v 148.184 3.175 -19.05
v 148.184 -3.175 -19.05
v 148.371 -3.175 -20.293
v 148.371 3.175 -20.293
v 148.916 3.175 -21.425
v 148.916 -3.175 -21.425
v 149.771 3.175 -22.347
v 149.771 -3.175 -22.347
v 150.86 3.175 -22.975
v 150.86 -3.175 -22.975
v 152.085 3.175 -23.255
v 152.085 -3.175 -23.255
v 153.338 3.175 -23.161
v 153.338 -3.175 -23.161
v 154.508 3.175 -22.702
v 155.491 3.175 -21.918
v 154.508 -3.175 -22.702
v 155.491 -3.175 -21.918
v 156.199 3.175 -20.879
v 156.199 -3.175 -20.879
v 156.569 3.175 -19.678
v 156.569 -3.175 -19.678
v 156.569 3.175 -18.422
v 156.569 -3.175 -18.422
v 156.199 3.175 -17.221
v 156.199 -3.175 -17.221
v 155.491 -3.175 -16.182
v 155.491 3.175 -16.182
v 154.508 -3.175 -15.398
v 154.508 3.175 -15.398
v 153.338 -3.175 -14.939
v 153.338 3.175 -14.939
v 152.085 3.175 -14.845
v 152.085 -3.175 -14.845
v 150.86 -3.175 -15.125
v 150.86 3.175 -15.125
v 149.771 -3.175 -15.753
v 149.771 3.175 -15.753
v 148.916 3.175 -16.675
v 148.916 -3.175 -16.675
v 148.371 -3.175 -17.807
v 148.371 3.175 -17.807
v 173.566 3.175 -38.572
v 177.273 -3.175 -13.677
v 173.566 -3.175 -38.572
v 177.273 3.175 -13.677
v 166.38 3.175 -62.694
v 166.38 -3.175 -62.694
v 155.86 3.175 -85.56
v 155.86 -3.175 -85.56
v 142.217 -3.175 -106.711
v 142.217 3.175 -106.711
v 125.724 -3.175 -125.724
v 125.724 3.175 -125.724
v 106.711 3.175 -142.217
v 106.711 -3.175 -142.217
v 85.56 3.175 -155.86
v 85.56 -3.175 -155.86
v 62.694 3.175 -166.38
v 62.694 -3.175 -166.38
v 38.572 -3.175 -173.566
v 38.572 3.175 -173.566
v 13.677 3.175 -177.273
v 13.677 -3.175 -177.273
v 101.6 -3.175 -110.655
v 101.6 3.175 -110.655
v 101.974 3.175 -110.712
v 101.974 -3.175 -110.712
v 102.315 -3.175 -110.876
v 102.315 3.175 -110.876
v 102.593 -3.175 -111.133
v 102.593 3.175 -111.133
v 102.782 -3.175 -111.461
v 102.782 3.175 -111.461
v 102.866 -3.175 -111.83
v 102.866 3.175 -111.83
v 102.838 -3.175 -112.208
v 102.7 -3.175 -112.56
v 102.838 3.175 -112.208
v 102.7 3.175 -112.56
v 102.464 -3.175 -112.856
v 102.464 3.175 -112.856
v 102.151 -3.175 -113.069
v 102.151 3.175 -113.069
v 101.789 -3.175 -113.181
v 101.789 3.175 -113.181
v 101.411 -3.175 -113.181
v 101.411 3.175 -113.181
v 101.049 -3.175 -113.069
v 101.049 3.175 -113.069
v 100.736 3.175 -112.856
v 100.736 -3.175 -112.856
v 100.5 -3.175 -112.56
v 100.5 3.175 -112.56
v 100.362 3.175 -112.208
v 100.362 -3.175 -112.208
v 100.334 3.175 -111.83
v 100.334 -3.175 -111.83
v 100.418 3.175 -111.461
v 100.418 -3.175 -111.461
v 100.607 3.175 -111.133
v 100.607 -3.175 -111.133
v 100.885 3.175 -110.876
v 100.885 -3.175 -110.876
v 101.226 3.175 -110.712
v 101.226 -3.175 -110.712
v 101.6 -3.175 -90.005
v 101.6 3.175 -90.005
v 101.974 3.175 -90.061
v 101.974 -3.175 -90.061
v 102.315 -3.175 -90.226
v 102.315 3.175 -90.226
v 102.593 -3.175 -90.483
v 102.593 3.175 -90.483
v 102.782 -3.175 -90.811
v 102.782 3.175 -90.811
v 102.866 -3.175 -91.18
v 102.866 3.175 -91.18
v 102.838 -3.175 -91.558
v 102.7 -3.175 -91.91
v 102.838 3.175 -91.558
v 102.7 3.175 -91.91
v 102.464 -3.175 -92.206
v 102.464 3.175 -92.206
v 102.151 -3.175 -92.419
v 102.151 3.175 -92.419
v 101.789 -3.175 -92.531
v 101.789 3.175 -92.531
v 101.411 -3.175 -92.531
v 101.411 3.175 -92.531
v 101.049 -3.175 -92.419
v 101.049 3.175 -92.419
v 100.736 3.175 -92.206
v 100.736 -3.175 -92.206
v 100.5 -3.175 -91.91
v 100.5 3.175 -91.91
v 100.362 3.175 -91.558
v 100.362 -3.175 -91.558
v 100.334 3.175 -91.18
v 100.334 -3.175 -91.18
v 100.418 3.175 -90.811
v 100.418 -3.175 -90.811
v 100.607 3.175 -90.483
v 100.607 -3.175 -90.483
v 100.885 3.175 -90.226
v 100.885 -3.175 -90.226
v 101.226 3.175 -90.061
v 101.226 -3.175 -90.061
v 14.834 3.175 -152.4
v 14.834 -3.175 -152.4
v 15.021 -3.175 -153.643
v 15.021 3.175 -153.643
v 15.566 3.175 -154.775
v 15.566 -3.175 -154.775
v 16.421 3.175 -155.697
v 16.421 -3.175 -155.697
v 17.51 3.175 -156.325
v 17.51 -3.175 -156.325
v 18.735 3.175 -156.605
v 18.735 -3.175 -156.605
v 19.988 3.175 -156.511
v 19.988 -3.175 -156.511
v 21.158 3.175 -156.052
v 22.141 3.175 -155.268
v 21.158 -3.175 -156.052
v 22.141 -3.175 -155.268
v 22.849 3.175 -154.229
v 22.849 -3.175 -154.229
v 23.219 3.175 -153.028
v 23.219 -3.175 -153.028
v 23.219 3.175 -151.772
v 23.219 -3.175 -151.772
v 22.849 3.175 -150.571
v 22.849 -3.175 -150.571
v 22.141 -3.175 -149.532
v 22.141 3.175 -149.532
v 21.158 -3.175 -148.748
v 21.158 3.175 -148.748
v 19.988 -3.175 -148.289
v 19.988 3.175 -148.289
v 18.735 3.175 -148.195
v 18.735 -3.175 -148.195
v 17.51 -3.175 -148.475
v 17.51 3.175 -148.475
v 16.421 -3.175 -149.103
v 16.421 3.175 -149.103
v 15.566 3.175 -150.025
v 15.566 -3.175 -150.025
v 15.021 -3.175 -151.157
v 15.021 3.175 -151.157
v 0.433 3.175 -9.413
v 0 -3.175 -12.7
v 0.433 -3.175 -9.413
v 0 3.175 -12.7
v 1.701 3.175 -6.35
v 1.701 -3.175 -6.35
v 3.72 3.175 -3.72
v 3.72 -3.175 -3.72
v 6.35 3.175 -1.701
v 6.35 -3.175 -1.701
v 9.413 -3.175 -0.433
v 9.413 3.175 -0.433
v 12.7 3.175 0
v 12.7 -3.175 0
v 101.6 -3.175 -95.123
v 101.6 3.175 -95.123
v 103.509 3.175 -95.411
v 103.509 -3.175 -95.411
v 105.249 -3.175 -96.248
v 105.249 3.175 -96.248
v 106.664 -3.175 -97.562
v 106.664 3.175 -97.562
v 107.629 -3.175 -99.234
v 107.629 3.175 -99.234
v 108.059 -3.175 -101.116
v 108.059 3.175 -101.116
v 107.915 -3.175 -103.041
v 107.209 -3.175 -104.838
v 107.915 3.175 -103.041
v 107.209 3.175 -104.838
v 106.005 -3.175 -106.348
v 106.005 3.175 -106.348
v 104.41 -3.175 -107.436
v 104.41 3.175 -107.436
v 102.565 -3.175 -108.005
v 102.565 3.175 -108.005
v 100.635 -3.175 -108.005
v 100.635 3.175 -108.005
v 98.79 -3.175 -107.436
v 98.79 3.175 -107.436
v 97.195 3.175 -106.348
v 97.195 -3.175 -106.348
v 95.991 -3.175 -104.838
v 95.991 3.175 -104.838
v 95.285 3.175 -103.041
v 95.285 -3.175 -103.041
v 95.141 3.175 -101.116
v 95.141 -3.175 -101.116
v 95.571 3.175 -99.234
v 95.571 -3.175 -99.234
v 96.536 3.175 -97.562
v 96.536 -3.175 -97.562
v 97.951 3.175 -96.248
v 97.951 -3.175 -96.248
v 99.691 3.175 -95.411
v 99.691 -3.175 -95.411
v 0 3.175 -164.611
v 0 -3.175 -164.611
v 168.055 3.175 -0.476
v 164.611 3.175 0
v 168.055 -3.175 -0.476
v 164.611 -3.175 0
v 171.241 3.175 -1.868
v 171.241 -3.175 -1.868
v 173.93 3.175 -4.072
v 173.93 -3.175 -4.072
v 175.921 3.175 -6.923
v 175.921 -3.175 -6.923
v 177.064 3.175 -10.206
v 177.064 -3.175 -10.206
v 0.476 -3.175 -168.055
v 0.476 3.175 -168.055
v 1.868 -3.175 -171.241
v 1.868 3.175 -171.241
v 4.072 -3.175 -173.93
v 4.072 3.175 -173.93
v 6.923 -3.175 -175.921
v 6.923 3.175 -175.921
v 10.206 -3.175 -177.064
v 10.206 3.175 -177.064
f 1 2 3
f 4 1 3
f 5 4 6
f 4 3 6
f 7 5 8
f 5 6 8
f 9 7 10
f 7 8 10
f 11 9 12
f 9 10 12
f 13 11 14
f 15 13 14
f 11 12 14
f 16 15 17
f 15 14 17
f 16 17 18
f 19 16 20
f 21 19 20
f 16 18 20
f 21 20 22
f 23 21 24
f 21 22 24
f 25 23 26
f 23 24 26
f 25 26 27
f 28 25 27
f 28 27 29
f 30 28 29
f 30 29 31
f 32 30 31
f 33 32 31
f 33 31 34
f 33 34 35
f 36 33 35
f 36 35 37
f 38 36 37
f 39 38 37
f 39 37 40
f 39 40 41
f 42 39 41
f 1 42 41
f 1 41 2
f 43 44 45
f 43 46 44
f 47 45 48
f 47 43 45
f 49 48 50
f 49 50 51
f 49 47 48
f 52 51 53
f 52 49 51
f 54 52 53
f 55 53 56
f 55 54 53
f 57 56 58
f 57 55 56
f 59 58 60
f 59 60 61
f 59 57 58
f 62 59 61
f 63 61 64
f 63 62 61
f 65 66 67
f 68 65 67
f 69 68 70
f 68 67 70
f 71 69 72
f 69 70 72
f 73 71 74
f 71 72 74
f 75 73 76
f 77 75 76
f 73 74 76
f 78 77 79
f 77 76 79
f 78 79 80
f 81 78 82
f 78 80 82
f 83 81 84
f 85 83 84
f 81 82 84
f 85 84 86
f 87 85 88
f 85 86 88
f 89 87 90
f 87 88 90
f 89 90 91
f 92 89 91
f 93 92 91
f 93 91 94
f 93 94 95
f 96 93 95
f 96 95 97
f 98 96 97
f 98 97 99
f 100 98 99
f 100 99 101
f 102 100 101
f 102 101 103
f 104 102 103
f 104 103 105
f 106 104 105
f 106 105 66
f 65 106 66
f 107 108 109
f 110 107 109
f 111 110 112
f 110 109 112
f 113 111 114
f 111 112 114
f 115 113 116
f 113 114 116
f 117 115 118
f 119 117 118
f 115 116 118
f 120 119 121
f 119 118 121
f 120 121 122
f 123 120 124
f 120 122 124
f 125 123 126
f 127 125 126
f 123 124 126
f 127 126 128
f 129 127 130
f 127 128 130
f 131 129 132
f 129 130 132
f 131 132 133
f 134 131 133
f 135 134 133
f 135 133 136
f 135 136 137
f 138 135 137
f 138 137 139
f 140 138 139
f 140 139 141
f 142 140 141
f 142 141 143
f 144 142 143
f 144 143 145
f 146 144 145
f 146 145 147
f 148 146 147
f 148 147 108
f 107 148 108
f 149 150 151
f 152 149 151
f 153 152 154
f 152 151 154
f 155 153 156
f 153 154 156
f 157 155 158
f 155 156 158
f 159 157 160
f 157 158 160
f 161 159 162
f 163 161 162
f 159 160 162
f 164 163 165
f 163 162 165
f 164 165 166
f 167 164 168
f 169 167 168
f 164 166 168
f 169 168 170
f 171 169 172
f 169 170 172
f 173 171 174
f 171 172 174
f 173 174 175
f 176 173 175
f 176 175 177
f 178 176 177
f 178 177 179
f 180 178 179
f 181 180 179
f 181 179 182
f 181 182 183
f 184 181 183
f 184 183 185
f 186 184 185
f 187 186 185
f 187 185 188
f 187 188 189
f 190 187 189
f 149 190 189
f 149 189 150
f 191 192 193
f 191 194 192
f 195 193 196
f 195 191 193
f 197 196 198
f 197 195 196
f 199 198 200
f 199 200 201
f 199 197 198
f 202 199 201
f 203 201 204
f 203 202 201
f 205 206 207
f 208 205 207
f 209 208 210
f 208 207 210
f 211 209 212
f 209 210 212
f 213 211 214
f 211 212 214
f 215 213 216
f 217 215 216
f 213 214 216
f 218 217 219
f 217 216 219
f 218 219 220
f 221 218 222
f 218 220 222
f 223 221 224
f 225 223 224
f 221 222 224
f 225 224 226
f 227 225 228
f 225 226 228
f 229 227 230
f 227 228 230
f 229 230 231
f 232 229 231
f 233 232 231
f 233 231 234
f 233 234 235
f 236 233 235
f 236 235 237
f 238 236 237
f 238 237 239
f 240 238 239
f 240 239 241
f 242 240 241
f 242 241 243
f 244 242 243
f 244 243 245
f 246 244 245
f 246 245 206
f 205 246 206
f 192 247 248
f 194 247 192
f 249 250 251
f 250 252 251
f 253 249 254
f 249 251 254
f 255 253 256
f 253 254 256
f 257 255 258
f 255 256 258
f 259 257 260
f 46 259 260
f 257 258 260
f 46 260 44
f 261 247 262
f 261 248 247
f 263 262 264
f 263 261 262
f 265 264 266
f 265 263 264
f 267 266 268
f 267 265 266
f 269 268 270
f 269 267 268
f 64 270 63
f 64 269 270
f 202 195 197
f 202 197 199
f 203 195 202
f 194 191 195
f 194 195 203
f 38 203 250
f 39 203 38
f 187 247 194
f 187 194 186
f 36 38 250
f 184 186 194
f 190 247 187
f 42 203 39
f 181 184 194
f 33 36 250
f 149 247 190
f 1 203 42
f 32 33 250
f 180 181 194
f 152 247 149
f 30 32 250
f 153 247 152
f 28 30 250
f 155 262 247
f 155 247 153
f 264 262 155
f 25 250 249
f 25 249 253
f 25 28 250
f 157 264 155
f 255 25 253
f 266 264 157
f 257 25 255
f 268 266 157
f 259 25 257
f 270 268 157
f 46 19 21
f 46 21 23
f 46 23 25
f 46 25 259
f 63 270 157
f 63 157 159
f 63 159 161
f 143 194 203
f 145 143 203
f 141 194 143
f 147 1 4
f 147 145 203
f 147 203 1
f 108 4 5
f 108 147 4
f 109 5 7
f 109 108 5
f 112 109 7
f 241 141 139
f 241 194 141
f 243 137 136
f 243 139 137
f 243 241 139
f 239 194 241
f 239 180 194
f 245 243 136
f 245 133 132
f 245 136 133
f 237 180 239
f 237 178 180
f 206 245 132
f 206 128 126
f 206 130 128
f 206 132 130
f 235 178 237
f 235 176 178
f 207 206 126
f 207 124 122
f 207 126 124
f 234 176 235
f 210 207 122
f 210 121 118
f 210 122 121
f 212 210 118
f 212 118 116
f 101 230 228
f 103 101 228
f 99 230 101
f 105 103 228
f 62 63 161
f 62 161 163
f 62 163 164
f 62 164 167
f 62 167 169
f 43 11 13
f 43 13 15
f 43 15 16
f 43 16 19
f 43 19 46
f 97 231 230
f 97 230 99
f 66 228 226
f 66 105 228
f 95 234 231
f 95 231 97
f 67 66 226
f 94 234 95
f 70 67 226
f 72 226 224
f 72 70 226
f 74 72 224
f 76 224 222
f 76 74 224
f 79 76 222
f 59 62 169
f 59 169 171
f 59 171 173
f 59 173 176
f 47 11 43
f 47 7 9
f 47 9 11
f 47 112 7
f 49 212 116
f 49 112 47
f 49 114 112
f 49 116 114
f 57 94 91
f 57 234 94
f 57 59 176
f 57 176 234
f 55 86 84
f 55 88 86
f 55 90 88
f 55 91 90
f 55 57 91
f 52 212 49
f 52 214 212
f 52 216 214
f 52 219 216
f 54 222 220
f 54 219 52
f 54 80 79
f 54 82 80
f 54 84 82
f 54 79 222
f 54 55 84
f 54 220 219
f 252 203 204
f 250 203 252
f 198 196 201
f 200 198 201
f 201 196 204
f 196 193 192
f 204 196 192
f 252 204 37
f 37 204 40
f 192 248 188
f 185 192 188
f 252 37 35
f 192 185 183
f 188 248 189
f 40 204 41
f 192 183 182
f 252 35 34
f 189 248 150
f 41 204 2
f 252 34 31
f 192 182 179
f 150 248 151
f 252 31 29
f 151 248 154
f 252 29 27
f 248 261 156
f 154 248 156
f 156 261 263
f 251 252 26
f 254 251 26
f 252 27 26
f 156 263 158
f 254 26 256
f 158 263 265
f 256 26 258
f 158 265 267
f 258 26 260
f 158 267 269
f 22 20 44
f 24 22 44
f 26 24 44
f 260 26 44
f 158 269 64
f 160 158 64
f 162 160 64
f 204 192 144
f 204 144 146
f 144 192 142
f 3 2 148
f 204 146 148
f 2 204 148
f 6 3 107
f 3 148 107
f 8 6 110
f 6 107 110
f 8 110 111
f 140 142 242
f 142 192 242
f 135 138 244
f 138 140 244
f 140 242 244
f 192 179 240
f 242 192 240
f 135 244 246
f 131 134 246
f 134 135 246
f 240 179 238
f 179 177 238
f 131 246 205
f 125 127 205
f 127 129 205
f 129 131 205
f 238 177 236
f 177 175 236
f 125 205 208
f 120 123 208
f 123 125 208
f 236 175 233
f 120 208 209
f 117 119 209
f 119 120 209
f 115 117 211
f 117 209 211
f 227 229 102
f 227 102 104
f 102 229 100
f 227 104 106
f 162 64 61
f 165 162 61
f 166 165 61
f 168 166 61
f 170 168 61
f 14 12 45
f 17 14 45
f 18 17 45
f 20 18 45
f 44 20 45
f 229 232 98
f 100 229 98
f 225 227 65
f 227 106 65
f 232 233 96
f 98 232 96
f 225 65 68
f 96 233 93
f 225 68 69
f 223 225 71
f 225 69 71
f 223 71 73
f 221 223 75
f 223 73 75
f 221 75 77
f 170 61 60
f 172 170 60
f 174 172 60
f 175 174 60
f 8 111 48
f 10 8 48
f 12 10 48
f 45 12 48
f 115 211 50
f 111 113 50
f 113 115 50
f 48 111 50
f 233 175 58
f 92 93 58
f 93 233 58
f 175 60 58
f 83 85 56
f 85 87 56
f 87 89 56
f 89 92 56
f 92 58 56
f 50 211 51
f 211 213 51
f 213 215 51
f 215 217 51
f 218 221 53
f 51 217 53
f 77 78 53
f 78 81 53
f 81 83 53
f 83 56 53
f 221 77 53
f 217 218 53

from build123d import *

# Parameters (mm, degrees)
BOSS_EXTRUDE1_DEPTH      = 3.175
SKETCH2_R                = 6.477
SKETCH2_R_2              = 1.27
CUT_EXTRUDE1_DEPTH       = 252.527339468
Q_0_332_DIAMETER_HOLE1_D = 8.4328
FILLET1_R                = 12.7


with BuildPart() as part:
    # Sketch1 → Boss-Extrude1 (new, symmetric)
    with BuildSketch(Plane(origin=(0, 0, 0), x_dir=(1, 0, 0), z_dir=(0, 1, 0))):
        with BuildLine():
            Line((0, 177.8), (0, 0))
            Line((0, 0), (177.8, 0))
            ThreePointArc((177.8, 0), (125.723585695, 125.723585695), (0, 177.8))
        make_face()
    extrude(amount=BOSS_EXTRUDE1_DEPTH, both=True)

    # Sketch2 → Cut-Extrude1 (cut, through all)
    with BuildSketch(Plane(origin=(0, 3.175, 0), x_dir=(1, 0, 0), z_dir=(0, 1, 0))):
        with Locations(Location((101.6, 101.6, 0), (0, 0, 270))):
            Circle(SKETCH2_R)
        with Locations(Location((101.6, 91.2749, 0), (0, 0, 270))):
            Circle(SKETCH2_R_2)
        with Locations(Location((101.6, 111.9251, 0), (0, 0, 270))):
            Circle(SKETCH2_R_2)
    extrude(amount=-CUT_EXTRUDE1_DEPTH, mode=Mode.SUBTRACT)

    # Q (0.332) Diameter Hole1 (through all)
    with Locations(Plane(origin=(0, 3.175, 0), x_dir=(1, 0, 0), z_dir=(0, 1, 0))):
        with Locations((19.05, 152.4), (152.4, 19.05)):
            Hole(Q_0_332_DIAMETER_HOLE1_D / 2)

    # Fillet1
    fillet1_edges = [part.edges().sort_by_distance(p)[0] for p in [
        (0, 0, 0),
        (0, 0, -177.8),
        (177.8, 0, 0),
    ]]
    fillet(fillet1_edges, radius=FILLET1_R)


solid = part.part
